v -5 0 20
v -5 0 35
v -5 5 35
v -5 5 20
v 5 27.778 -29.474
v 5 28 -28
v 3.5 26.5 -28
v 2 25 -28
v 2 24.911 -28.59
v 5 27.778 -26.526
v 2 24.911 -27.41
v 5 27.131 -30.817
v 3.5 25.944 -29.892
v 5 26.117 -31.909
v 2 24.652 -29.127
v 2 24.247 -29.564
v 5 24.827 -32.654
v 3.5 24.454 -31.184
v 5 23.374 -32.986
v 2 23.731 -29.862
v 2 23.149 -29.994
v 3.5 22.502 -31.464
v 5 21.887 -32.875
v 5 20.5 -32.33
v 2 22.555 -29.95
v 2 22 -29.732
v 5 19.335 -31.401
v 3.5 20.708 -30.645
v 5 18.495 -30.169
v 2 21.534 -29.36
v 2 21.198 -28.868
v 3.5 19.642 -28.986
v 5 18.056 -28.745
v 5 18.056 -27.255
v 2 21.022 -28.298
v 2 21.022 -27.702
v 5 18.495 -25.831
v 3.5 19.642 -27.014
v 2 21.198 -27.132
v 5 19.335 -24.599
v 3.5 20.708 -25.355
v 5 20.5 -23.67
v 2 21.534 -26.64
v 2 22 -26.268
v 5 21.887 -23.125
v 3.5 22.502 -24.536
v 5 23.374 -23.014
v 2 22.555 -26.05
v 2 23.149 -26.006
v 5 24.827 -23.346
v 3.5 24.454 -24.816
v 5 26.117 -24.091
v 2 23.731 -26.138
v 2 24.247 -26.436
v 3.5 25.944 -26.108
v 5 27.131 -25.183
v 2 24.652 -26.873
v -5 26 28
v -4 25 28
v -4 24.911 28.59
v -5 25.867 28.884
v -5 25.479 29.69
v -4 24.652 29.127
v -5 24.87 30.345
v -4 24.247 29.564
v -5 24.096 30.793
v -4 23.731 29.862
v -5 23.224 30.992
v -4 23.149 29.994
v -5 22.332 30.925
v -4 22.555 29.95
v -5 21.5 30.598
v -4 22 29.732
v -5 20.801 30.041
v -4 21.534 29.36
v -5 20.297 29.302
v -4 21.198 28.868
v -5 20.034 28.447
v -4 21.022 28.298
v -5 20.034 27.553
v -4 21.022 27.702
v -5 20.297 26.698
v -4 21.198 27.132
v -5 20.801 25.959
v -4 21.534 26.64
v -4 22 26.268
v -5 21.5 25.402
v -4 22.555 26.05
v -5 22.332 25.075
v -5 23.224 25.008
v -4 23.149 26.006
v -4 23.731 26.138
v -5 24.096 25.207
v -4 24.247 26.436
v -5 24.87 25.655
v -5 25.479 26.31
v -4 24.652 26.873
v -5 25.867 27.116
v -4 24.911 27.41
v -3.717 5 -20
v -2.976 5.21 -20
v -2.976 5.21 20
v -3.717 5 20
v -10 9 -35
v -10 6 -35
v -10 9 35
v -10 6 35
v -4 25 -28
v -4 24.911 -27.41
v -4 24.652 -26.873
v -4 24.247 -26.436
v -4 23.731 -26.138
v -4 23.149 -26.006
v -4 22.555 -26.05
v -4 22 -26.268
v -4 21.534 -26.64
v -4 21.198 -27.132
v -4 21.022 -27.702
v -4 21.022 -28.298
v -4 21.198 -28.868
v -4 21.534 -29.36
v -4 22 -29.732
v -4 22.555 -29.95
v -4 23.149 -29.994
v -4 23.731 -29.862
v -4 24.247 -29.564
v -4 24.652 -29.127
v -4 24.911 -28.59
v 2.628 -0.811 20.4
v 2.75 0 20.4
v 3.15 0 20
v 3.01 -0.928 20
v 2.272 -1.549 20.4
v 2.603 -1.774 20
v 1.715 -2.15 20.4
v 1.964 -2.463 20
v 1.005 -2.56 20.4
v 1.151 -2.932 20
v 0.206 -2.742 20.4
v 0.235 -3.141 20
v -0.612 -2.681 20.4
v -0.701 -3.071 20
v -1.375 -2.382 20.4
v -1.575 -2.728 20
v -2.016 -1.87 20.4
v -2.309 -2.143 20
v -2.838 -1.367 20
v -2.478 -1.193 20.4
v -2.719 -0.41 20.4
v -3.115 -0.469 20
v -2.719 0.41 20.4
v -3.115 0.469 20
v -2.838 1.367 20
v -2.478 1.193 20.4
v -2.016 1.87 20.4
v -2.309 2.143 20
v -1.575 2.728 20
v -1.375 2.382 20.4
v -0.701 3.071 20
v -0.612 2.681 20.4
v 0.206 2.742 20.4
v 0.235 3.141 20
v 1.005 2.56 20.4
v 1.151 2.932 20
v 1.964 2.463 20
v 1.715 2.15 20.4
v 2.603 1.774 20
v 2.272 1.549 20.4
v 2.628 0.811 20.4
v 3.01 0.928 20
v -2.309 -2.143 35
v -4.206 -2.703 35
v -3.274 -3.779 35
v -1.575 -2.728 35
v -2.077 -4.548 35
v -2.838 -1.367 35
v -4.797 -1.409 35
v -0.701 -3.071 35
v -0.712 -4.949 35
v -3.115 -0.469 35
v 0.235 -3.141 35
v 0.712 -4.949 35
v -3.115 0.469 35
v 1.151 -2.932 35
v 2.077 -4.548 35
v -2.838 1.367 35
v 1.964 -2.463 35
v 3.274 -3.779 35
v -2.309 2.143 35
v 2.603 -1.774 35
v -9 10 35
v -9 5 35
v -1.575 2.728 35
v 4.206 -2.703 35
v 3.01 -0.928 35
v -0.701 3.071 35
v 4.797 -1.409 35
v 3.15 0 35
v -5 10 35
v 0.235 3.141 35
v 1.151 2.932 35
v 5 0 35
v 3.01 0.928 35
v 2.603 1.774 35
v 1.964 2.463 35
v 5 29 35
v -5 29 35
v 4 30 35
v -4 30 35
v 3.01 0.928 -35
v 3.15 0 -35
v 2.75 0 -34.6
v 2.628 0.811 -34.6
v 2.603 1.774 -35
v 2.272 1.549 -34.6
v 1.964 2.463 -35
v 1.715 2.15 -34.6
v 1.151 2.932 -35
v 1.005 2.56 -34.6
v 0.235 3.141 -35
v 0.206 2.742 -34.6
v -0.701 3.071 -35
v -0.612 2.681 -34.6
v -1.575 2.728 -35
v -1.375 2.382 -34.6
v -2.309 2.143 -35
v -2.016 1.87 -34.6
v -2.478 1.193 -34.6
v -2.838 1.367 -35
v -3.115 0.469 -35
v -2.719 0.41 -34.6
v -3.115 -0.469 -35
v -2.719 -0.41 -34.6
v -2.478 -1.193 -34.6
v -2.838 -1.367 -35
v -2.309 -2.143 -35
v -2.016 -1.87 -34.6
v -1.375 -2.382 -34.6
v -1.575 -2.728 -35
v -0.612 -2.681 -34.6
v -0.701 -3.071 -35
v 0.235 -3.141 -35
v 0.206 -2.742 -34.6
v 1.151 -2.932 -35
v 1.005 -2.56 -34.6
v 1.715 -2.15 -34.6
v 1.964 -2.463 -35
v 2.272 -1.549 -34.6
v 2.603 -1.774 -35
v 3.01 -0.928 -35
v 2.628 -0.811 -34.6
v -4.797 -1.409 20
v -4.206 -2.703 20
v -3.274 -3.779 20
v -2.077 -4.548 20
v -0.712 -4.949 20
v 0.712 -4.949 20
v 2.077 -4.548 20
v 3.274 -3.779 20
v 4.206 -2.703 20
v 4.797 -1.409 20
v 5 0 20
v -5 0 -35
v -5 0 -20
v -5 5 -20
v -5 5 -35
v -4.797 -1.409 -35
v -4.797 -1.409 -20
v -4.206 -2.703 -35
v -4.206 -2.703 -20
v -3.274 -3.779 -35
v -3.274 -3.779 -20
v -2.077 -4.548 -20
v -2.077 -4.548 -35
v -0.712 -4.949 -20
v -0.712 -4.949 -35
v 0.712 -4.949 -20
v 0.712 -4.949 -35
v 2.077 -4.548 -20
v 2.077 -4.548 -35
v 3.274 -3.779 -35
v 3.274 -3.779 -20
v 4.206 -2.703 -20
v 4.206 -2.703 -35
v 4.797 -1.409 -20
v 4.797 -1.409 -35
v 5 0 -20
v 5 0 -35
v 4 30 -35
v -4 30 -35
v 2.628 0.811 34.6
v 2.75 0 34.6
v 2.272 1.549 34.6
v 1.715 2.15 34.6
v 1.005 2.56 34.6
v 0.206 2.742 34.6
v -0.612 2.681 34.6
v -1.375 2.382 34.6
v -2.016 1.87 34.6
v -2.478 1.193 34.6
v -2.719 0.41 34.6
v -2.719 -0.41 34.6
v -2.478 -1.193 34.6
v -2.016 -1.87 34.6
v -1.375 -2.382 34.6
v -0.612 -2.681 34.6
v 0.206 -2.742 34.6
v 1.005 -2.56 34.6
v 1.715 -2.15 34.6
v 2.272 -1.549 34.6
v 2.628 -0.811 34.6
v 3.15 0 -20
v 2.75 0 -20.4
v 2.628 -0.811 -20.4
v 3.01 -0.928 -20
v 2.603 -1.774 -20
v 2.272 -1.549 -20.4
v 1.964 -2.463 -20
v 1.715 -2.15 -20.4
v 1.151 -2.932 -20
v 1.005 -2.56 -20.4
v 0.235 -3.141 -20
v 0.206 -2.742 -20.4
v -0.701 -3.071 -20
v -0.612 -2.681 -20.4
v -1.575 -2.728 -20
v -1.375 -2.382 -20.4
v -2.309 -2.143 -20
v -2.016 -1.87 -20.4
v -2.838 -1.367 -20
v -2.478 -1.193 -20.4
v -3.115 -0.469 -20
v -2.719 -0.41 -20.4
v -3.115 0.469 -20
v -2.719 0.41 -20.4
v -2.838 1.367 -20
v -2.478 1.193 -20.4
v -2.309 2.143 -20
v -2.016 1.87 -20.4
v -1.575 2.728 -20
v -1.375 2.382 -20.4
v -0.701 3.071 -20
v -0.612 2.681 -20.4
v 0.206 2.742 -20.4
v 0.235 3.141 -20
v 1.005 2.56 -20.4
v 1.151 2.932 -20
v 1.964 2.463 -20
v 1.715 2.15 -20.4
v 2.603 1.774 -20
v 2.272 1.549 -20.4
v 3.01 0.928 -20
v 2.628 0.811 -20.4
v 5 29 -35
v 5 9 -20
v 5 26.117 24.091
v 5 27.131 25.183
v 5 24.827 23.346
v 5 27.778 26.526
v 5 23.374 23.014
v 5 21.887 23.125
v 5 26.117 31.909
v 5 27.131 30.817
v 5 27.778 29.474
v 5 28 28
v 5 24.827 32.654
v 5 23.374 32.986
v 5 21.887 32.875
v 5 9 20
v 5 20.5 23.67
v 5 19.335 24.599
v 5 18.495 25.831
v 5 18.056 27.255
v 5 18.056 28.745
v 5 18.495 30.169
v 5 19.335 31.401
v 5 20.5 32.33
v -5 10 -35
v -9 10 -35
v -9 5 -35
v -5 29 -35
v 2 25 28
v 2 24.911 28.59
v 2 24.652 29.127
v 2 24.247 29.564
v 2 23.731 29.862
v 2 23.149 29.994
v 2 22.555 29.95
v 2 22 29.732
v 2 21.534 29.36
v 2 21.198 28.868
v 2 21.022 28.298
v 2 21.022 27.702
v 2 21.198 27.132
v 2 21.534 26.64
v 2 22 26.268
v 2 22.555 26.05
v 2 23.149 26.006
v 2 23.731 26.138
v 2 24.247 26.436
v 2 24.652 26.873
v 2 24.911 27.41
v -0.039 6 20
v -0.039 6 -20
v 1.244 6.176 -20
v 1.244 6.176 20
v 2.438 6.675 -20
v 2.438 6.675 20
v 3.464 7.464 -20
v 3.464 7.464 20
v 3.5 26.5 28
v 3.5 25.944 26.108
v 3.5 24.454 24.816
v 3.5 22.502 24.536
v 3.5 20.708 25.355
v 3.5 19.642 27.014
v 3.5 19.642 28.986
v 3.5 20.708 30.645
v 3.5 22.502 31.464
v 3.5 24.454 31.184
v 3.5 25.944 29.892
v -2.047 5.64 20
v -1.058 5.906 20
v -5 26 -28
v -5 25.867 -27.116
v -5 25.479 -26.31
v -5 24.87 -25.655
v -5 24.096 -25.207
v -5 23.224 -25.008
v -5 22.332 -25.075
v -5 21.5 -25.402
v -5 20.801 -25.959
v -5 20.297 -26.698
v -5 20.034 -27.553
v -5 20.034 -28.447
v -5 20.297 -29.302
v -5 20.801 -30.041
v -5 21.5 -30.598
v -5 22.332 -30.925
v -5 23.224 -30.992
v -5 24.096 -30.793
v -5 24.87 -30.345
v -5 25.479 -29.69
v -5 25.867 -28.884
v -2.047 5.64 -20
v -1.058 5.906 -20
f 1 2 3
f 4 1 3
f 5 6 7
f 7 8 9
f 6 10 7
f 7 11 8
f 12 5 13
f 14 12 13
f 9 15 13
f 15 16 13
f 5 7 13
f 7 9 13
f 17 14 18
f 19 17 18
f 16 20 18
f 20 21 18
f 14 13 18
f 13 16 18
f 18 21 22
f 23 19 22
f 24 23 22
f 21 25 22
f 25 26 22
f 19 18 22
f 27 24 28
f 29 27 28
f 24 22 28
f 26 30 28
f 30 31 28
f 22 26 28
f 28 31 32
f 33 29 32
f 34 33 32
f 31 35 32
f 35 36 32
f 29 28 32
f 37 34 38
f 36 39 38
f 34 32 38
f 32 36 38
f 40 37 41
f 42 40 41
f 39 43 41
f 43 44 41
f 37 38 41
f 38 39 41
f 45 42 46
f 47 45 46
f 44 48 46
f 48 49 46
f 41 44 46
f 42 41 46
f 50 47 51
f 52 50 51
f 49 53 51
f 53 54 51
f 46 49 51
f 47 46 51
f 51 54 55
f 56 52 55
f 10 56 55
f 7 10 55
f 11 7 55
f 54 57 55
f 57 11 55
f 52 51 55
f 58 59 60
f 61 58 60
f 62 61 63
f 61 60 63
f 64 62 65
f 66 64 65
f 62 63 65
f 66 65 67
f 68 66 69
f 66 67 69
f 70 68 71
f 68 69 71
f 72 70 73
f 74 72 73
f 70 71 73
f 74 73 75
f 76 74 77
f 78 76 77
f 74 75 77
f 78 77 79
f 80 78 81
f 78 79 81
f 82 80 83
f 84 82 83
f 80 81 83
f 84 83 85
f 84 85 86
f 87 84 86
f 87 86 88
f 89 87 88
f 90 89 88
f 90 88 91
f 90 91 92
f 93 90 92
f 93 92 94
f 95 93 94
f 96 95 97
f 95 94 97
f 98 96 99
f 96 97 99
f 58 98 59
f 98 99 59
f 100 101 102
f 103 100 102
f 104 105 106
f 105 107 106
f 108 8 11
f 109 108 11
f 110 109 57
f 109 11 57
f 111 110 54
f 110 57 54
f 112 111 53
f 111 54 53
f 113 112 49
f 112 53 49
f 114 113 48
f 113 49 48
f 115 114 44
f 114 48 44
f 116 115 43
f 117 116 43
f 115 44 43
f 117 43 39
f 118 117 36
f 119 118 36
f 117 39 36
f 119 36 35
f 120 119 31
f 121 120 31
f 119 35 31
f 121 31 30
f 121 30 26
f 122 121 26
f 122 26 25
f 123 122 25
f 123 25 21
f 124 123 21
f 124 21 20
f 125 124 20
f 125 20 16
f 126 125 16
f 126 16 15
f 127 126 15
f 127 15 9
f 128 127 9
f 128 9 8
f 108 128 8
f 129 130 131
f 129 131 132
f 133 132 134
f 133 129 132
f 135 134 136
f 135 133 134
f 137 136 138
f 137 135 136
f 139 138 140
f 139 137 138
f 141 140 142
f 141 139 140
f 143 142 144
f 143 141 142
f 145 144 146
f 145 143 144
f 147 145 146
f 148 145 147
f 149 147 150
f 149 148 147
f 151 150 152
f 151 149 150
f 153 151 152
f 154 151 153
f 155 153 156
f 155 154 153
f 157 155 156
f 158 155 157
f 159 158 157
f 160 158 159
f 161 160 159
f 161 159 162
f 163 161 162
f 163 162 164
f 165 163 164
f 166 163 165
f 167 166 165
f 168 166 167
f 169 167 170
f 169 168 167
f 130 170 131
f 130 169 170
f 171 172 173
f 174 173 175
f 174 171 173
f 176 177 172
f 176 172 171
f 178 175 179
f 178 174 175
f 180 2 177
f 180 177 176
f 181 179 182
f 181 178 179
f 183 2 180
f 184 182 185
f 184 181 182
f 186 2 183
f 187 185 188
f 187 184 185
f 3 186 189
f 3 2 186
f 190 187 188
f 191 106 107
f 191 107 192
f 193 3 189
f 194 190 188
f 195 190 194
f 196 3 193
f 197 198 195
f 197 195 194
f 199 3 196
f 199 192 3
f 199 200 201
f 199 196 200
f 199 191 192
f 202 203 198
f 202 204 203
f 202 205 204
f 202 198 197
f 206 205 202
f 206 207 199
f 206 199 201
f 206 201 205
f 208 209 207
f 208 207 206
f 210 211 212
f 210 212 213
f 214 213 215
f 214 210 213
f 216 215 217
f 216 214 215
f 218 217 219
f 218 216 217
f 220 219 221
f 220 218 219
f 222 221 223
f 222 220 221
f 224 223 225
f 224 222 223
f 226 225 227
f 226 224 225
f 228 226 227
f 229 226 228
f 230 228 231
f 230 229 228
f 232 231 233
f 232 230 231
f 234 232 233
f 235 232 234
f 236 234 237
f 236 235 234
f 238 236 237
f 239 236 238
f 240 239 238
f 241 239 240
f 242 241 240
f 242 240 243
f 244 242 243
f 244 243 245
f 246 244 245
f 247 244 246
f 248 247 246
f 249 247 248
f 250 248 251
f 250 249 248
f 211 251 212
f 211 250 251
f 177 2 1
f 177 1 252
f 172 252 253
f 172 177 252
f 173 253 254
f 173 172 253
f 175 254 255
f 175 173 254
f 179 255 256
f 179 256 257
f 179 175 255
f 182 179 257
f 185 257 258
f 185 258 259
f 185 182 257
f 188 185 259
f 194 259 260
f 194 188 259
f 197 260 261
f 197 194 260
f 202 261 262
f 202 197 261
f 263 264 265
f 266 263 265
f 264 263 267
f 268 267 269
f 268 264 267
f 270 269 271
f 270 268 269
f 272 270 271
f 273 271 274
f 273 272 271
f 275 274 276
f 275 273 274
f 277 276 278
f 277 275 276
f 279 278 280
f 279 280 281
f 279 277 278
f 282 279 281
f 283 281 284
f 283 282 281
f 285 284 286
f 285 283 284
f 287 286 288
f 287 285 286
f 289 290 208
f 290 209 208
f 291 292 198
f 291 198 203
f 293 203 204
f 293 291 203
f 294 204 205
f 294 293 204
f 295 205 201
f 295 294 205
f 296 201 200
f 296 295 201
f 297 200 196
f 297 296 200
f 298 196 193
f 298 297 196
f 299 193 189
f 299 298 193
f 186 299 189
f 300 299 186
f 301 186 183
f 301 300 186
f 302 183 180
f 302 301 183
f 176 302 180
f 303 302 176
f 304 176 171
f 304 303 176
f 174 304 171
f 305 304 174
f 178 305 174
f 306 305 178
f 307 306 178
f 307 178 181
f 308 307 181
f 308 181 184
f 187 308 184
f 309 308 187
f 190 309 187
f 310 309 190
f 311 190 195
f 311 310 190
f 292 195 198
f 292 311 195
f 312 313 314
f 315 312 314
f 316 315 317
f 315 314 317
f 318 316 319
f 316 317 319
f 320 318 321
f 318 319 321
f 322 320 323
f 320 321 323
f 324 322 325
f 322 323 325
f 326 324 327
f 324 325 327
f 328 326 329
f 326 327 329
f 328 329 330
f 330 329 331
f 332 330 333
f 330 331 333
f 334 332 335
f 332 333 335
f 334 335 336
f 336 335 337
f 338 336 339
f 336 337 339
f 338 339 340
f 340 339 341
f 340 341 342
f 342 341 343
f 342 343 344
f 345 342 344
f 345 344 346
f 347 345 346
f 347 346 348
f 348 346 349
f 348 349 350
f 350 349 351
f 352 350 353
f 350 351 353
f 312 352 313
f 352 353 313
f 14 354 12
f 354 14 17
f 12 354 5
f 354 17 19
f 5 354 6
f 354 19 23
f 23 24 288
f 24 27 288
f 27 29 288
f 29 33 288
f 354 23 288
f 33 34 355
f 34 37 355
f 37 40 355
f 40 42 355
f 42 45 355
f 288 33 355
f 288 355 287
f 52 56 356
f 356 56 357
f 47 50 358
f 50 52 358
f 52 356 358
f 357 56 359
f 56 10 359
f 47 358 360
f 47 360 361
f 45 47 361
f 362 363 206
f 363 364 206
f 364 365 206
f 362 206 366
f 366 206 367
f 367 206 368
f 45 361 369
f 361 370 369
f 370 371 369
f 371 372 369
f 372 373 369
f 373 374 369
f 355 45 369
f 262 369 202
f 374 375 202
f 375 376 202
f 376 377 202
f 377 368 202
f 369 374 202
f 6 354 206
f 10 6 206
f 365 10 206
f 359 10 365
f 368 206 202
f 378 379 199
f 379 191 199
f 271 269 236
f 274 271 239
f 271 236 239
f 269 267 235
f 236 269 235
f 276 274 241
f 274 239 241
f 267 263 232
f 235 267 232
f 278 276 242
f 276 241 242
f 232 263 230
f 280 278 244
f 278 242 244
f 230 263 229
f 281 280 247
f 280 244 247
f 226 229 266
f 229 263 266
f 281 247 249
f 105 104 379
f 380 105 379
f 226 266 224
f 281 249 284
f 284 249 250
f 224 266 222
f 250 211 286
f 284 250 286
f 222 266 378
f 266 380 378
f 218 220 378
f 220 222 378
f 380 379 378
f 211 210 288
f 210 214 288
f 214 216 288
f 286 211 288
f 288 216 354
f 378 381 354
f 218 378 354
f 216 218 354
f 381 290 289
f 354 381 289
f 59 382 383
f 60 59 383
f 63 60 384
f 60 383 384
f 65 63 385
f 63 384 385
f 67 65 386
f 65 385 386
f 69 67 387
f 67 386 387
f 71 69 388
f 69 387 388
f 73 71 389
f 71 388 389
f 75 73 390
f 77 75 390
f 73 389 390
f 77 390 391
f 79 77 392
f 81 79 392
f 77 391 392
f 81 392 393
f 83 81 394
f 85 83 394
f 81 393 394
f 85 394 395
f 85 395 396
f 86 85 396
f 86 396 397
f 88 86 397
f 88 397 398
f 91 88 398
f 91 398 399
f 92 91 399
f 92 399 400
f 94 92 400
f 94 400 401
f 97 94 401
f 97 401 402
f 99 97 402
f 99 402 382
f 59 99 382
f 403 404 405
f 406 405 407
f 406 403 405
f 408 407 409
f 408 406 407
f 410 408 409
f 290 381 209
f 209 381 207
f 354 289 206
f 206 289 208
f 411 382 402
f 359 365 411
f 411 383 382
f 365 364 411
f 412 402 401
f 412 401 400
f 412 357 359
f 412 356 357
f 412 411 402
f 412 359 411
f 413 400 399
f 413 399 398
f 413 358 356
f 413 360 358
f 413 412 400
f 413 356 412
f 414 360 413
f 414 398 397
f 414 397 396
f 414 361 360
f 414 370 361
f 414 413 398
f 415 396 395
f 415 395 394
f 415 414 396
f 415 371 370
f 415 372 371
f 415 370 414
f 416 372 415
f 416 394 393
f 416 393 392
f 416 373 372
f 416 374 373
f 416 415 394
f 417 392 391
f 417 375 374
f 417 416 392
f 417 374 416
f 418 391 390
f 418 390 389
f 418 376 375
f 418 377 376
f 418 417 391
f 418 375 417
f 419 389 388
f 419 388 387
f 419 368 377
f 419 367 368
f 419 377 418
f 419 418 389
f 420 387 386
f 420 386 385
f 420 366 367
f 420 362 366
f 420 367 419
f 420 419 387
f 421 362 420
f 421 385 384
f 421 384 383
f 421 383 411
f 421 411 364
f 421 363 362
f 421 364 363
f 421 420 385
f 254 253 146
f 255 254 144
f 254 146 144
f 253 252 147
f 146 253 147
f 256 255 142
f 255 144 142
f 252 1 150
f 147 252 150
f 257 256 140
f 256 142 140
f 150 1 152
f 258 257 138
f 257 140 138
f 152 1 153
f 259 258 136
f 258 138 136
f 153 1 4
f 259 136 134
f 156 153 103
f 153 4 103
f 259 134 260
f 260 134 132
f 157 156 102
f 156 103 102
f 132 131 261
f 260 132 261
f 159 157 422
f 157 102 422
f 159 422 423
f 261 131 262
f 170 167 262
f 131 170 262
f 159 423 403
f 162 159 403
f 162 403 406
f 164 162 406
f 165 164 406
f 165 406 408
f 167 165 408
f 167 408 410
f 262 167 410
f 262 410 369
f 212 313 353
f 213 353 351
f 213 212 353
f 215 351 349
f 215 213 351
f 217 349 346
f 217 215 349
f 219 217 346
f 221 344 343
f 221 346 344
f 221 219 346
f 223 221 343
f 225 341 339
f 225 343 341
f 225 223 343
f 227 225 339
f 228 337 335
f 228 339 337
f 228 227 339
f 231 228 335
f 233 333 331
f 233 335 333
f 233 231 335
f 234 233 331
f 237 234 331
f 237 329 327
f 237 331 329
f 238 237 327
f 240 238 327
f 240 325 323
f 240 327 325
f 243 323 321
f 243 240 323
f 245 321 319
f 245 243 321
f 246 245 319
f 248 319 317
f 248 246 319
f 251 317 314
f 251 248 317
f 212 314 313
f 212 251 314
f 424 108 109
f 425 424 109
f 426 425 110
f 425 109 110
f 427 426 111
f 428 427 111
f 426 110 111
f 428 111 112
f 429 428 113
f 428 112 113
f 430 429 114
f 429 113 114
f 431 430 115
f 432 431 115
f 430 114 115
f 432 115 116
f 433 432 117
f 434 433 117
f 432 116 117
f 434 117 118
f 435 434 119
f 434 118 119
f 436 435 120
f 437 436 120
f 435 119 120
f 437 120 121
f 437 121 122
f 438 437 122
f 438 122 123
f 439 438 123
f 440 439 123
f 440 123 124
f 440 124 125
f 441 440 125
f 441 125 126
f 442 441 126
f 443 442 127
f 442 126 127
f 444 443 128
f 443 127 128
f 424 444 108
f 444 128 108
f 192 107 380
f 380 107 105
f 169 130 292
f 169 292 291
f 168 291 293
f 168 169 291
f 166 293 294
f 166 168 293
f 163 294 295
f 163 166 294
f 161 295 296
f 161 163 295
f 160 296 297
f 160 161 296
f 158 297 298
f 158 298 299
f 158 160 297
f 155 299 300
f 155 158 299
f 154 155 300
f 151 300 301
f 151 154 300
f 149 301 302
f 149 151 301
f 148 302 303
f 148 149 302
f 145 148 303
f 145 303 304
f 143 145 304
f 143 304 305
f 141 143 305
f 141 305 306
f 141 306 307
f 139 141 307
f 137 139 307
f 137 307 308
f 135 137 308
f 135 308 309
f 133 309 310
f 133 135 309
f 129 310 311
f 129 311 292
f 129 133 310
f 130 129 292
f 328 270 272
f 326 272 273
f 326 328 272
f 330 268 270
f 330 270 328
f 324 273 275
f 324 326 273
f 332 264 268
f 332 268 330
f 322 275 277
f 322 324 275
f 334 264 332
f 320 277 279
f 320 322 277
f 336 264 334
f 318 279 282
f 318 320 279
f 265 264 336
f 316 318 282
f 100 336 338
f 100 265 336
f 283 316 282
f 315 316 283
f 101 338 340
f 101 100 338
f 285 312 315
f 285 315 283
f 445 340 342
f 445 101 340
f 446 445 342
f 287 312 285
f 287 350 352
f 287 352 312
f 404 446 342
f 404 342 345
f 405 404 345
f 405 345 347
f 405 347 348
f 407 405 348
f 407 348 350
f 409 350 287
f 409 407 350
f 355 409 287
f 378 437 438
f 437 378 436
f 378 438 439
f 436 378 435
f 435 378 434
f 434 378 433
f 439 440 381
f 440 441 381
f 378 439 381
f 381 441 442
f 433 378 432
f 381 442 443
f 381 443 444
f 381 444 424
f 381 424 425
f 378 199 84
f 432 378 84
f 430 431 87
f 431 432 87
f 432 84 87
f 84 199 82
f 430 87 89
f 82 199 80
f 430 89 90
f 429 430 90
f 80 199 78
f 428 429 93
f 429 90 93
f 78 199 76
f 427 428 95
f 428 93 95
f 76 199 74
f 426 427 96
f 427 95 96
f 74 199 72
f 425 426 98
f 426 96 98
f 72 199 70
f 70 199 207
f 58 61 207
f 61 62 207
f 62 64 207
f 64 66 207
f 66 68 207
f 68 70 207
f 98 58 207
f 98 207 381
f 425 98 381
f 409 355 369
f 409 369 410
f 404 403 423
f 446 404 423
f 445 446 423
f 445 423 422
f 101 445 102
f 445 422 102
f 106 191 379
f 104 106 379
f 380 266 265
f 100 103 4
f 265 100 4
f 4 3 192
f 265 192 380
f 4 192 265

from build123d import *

# Parameters (mm, degrees)
SKETCH007_R          = 2.75
PAD004_DEPTH         = 35
SKETCH008_W          = 10
SKETCH008_H          = 10
POCKET003_DEPTH      = 20
SKETCH009_R          = 6
POCKET004_DEPTH      = 20
CHAMFER007_SIZE      = 0.4
CHAMFER008_SIZE      = 0.4
CHAMFER009_SIZE      = 1
SKETCH014_R          = 2
POCKET008_DEPTH      = 10.001
POCKET008_DEPTH_BACK = 5.001
CHAMFER014_SIZE      = 1
CHAMFER019_SIZE      = 3
POCKET011_DEPTH      = 20
FILLET007_R          = 5


with BuildPart() as part:
    # Sketch007 → Pad004 (new body, symmetric)
    with BuildSketch(Plane.XY):
        with BuildLine():
            ThreePointArc((-5, 0), (0, -5), (5, 0))
            Line((5, 30), (5, 0))
            Line((-5, 30), (5, 30))
            Line((-5, 10), (-5, 30))
            Line((-10, 10), (-5, 10))
            Line((-10, 5), (-10, 10))
            Line((-5, 5), (-10, 5))
            Line((-5, 0), (-5, 5))
        make_face()
        Circle(SKETCH007_R, mode=Mode.SUBTRACT)
    extrude(amount=PAD004_DEPTH, both=True)

    # Sketch008 → Pocket003 (cut, symmetric)
    with BuildSketch(Plane.XY):
        Rectangle(SKETCH008_W, SKETCH008_H)
    extrude(amount=POCKET003_DEPTH, both=True, mode=Mode.SUBTRACT)

    # Sketch009 → Pocket004 (cut, symmetric)
    with BuildSketch(Plane.XY):
        Circle(SKETCH009_R)
    extrude(amount=POCKET004_DEPTH, both=True, mode=Mode.SUBTRACT)

    # Chamfer007
    chamfer007_edges = [part.edges().sort_by_distance(p)[0] for p in [
        (-3.316625, 5, 0),
    ]]
    chamfer(chamfer007_edges, length=CHAMFER007_SIZE)

    # Chamfer008
    chamfer008_edges = [part.edges().sort_by_distance(p)[0] for p in [
        (-2.75, 0, 20),
        (-2.75, 0, -20),
        (-2.75, 0, -35),
        (-2.75, 0, 35),
    ]]
    chamfer(chamfer008_edges, length=CHAMFER008_SIZE)

    # Chamfer009
    chamfer009_edges = [part.edges().sort_by_distance(p)[0] for p in [
        (-10, 5, 0),
        (-10, 10, 0),
        (5, 30, 0),
        (-5, 30, 0),
    ]]
    chamfer(chamfer009_edges, length=CHAMFER009_SIZE)

    # Sketch014 → Pocket008 (cut, two sides)
    with BuildSketch(Plane.YZ) as pocket008_sk:
        with Locations((23, 28)):
            Circle(SKETCH014_R)
        with Locations((23, -28)):
            Circle(SKETCH014_R)
    extrude(amount=-POCKET008_DEPTH, mode=Mode.SUBTRACT)
    extrude(pocket008_sk.sketch, amount=POCKET008_DEPTH_BACK, mode=Mode.SUBTRACT)

    # Chamfer014
    chamfer014_edges = [part.edges().sort_by_distance(p)[0] for p in [
        (-5, 21, -28),
        (-5, 21, 28),
    ]]
    chamfer(chamfer014_edges, length=CHAMFER014_SIZE)

    # Chamfer019
    chamfer019_edges = [part.edges().sort_by_distance(p)[0] for p in [
        (5, 21, 28),
        (5, 21, -28),
    ]]
    chamfer(chamfer019_edges, length=CHAMFER019_SIZE)

    # Sketch018 → Pocket011 (cut, symmetric)
    with BuildSketch(Plane.XY):
        Polygon((5, 9), (1, 5), (5, 5), align=None)
    extrude(amount=POCKET011_DEPTH, both=True, mode=Mode.SUBTRACT)

    # Fillet007
    fillet007_edges = [part.edges().sort_by_distance(p)[0] for p in [
        (1.741657, 5.741657, 0),
    ]]
    fillet(fillet007_edges, radius=FILLET007_R)


solid = part.part
